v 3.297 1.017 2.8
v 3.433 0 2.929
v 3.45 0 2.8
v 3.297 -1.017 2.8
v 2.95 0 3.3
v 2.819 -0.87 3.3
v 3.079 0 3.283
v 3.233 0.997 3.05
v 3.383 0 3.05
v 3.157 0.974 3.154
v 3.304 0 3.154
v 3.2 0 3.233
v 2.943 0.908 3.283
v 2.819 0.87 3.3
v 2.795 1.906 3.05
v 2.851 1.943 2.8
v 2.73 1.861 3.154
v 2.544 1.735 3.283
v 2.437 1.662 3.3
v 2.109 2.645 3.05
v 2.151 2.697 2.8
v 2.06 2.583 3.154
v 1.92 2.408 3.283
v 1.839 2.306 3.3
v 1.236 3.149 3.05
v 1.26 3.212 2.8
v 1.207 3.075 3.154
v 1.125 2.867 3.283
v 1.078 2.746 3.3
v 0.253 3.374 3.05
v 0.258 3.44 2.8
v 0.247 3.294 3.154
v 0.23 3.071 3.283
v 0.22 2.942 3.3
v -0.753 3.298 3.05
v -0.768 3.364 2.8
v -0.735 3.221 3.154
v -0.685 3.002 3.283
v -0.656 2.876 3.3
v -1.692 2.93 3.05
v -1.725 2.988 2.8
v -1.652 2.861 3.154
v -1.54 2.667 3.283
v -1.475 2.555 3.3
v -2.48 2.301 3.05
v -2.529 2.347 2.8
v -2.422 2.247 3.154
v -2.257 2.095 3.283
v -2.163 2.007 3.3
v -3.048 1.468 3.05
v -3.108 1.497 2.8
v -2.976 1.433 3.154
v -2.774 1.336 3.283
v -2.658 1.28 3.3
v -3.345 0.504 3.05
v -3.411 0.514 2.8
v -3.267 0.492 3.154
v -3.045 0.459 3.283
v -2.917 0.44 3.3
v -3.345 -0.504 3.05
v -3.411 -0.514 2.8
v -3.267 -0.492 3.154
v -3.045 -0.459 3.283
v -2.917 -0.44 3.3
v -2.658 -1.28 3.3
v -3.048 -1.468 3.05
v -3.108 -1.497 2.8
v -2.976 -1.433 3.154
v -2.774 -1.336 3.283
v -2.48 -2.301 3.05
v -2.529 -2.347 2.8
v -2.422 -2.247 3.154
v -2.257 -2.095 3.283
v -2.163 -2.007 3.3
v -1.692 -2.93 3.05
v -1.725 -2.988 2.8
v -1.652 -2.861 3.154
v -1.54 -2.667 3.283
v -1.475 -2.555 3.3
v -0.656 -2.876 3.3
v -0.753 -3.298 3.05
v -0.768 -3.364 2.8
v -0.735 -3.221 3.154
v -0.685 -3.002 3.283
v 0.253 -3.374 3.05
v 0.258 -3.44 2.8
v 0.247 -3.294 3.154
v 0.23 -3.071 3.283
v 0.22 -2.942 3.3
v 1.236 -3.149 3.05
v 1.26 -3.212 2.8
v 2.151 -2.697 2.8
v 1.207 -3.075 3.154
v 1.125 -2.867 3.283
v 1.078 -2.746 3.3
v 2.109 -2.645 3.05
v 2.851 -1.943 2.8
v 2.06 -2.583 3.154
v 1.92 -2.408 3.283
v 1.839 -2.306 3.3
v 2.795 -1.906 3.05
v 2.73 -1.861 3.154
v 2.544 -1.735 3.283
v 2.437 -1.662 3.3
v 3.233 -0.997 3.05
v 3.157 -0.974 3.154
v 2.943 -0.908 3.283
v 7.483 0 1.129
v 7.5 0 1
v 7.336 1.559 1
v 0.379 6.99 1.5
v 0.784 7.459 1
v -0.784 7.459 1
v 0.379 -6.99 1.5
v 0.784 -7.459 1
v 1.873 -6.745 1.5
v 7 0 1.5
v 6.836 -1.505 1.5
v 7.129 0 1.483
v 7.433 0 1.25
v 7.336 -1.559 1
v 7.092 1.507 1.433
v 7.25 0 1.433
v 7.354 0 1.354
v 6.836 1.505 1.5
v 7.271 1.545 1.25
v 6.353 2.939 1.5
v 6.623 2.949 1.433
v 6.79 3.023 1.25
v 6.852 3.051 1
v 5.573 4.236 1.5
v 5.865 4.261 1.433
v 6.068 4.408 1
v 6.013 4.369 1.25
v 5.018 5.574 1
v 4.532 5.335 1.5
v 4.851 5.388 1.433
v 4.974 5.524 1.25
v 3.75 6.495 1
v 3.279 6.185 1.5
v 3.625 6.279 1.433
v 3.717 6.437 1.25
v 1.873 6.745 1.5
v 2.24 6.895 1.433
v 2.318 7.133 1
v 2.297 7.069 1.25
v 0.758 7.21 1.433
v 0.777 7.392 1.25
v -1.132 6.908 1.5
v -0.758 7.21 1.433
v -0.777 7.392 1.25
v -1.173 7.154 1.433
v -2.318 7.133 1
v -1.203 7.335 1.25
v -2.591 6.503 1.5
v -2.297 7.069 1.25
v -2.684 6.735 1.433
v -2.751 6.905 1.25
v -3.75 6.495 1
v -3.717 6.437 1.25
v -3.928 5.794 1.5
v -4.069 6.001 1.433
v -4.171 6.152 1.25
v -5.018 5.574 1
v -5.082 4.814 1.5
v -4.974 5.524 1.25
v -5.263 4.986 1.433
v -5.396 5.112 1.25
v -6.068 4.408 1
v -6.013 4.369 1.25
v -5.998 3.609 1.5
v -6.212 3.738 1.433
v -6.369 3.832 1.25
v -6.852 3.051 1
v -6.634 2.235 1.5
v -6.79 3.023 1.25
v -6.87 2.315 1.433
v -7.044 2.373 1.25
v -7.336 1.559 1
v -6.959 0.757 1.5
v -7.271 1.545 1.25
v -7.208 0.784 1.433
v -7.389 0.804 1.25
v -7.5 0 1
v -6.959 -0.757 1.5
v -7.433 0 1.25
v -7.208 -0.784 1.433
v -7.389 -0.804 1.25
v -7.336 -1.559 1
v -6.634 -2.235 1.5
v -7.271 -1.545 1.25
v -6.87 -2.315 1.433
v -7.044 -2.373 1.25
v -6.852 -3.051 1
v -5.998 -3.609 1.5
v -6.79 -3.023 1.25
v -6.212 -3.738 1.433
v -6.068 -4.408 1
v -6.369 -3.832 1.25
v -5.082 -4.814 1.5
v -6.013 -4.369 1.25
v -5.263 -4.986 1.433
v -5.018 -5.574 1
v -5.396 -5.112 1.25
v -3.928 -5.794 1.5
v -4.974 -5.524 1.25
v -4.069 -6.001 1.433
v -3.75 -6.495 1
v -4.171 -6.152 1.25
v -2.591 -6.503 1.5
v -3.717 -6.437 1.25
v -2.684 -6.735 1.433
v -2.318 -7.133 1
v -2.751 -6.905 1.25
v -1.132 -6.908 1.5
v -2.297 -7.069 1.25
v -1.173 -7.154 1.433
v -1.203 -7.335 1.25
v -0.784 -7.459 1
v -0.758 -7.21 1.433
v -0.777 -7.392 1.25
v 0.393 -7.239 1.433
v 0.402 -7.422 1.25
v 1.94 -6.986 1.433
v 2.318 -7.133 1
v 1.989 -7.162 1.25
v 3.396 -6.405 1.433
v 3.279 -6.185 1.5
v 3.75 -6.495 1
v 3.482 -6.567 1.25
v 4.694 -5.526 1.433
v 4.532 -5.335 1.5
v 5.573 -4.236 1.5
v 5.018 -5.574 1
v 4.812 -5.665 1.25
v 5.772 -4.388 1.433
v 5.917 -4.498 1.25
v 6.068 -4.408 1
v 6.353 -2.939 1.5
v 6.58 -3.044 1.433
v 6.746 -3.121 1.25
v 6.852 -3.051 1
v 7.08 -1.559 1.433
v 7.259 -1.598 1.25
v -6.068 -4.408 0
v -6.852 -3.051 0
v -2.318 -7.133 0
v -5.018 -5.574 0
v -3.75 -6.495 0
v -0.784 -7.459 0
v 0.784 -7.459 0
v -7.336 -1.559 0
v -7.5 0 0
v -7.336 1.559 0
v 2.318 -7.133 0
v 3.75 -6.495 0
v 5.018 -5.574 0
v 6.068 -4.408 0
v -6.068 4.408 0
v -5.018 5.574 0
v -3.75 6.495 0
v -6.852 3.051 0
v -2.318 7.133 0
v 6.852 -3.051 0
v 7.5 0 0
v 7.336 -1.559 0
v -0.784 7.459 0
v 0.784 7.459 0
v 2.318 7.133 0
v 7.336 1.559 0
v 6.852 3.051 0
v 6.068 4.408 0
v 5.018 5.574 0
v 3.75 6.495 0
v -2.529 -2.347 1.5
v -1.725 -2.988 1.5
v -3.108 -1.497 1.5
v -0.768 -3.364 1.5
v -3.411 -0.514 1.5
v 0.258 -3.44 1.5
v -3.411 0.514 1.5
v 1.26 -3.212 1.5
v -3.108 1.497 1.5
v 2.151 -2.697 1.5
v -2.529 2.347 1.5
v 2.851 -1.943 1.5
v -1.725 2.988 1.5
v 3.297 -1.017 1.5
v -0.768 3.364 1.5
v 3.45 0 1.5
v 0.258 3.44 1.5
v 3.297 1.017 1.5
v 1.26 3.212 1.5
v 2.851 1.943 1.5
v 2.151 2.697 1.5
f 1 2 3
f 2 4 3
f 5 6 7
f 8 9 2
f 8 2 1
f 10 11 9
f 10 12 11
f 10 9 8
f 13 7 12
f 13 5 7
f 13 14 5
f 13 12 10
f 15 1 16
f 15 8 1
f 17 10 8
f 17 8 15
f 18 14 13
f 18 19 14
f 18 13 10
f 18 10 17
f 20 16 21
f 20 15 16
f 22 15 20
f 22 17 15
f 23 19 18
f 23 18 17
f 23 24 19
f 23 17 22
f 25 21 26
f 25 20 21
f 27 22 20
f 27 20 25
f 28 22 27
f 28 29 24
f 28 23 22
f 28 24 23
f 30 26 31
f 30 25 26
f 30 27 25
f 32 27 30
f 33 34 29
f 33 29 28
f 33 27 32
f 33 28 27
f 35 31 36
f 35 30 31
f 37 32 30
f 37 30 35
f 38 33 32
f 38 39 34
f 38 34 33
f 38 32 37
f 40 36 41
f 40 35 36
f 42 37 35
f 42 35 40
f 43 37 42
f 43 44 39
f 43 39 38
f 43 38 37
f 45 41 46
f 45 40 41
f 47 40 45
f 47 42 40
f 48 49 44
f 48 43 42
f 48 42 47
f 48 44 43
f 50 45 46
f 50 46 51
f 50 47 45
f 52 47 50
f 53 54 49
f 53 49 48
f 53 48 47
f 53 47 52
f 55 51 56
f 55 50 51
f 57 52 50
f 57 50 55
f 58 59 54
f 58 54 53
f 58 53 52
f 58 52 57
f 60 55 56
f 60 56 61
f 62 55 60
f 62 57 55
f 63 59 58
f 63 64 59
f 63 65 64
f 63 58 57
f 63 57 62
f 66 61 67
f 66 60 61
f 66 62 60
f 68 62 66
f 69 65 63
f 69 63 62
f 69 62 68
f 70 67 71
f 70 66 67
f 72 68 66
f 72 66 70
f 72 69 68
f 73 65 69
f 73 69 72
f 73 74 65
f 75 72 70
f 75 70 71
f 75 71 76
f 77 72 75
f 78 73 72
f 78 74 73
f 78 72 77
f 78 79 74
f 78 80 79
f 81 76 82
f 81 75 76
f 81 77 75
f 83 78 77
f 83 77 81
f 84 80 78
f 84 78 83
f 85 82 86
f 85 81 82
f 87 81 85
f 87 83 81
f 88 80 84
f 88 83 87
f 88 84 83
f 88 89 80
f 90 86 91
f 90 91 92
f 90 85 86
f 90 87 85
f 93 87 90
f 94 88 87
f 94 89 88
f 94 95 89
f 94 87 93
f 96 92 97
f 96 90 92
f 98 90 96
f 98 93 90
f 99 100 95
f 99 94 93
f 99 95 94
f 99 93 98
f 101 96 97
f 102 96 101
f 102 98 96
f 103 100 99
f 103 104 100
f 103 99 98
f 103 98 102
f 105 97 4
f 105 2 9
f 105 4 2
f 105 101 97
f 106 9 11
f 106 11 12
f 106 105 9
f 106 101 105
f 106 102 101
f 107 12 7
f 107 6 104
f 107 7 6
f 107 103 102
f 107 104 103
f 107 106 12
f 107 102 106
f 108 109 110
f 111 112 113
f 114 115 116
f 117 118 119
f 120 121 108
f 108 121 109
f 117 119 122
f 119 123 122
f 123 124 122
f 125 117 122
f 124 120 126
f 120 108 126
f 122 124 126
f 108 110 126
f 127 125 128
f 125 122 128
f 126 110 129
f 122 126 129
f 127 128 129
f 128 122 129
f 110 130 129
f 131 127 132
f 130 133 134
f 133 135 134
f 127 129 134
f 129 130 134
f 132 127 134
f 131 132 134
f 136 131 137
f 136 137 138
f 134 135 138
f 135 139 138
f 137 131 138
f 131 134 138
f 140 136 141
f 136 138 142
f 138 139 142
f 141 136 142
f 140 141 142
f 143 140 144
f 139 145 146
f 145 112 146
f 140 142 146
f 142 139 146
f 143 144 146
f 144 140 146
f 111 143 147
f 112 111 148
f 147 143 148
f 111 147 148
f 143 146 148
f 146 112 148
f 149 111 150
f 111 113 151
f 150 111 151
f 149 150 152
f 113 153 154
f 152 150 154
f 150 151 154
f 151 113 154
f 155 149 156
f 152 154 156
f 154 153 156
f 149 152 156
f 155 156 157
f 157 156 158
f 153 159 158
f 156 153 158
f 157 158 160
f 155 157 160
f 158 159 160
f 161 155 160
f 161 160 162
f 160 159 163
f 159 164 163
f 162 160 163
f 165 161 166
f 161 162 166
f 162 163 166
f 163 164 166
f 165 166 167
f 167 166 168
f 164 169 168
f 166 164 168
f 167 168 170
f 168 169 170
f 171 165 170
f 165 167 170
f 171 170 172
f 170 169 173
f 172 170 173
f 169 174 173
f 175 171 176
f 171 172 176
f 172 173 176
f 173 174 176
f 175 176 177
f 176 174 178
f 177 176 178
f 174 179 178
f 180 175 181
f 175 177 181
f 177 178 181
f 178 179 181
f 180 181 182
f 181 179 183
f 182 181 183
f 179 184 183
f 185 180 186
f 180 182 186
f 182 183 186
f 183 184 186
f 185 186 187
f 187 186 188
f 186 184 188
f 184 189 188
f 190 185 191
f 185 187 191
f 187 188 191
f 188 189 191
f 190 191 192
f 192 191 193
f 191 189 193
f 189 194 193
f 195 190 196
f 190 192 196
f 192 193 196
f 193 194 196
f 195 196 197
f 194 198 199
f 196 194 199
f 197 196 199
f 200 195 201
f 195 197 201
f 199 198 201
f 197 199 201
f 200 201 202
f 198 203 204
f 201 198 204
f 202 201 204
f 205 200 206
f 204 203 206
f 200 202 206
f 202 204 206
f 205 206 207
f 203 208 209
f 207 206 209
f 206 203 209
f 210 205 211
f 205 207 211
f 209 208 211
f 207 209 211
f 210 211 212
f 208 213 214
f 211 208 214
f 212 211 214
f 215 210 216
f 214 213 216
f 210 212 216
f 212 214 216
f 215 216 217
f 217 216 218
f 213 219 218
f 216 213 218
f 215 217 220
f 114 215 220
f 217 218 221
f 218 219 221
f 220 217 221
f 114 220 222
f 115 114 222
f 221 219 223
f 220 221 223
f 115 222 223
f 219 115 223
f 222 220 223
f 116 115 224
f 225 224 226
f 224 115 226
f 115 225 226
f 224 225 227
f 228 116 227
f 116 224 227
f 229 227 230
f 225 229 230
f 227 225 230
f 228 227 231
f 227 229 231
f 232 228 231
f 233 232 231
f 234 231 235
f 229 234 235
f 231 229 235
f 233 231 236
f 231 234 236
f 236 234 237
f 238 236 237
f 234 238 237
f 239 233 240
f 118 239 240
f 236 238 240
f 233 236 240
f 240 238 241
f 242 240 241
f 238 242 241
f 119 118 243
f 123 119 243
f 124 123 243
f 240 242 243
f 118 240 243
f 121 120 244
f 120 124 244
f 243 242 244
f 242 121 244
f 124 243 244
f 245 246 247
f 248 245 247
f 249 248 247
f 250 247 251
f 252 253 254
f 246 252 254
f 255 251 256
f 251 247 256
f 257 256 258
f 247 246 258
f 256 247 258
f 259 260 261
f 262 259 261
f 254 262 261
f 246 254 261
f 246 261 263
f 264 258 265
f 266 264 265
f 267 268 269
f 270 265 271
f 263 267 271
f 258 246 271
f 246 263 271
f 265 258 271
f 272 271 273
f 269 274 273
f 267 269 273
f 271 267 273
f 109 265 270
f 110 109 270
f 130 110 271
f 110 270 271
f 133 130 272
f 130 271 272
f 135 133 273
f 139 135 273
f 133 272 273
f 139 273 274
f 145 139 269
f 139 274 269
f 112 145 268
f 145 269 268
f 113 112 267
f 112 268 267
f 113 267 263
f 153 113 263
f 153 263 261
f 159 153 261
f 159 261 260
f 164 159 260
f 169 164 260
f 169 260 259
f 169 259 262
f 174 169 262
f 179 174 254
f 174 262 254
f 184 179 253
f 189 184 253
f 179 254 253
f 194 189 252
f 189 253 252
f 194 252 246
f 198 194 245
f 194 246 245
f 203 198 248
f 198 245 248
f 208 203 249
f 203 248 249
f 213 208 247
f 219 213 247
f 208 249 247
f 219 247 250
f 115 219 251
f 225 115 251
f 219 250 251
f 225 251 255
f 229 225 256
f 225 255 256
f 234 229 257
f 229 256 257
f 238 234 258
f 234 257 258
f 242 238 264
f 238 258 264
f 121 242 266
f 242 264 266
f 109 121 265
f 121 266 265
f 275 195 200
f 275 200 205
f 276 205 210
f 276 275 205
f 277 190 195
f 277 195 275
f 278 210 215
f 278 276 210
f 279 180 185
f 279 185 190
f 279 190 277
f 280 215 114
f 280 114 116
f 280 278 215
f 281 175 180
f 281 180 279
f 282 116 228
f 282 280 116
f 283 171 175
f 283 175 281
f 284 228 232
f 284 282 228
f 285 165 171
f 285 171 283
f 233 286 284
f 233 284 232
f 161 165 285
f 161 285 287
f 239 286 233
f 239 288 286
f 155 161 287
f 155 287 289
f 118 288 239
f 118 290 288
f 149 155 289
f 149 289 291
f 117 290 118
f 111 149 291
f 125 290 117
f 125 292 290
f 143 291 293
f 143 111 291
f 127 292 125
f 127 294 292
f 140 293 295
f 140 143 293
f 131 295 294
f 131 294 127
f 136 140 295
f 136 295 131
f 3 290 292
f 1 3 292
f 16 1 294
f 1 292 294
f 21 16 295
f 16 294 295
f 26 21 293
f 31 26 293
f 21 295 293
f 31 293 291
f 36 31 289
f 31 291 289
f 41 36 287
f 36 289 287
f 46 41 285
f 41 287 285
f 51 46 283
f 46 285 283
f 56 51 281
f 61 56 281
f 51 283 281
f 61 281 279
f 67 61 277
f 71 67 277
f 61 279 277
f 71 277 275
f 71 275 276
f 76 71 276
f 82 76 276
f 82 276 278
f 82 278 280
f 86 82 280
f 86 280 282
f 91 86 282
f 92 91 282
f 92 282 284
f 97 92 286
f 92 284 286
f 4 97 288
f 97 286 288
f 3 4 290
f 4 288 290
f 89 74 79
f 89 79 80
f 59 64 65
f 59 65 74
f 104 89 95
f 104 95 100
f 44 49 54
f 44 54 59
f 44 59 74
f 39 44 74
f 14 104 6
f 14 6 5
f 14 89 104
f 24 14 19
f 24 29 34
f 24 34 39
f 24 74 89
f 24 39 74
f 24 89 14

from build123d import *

# Parameters (mm, degrees)
F0_R     = 7.5
F1_DEPTH = 1.5
F2_R     = 3.45
F3_DEPTH = 1.8
F4_R     = 0.5
F5_R     = 0.5


with BuildPart() as f1:
    # F0 (on Top) → F1 (new body)
    with BuildSketch(Plane.XY):
        Circle(F0_R)
    extrude(amount=F1_DEPTH)

    # F2 (on face) → F3 (join)
    with BuildSketch(Plane.XY.offset(1.5)):
        Circle(F2_R)
    extrude(amount=F3_DEPTH)

    # F4
    f4_edges = [f1.edges().sort_by_distance(p)[0] for p in [
        (-3.45, 0, 3.3),
    ]]
    fillet(f4_edges, radius=F4_R)

    # F5
    f5_edges = [f1.edges().sort_by_distance(p)[0] for p in [
        (-7.5, 0, 1.5),
    ]]
    fillet(f5_edges, radius=F5_R)


solid = f1.part
